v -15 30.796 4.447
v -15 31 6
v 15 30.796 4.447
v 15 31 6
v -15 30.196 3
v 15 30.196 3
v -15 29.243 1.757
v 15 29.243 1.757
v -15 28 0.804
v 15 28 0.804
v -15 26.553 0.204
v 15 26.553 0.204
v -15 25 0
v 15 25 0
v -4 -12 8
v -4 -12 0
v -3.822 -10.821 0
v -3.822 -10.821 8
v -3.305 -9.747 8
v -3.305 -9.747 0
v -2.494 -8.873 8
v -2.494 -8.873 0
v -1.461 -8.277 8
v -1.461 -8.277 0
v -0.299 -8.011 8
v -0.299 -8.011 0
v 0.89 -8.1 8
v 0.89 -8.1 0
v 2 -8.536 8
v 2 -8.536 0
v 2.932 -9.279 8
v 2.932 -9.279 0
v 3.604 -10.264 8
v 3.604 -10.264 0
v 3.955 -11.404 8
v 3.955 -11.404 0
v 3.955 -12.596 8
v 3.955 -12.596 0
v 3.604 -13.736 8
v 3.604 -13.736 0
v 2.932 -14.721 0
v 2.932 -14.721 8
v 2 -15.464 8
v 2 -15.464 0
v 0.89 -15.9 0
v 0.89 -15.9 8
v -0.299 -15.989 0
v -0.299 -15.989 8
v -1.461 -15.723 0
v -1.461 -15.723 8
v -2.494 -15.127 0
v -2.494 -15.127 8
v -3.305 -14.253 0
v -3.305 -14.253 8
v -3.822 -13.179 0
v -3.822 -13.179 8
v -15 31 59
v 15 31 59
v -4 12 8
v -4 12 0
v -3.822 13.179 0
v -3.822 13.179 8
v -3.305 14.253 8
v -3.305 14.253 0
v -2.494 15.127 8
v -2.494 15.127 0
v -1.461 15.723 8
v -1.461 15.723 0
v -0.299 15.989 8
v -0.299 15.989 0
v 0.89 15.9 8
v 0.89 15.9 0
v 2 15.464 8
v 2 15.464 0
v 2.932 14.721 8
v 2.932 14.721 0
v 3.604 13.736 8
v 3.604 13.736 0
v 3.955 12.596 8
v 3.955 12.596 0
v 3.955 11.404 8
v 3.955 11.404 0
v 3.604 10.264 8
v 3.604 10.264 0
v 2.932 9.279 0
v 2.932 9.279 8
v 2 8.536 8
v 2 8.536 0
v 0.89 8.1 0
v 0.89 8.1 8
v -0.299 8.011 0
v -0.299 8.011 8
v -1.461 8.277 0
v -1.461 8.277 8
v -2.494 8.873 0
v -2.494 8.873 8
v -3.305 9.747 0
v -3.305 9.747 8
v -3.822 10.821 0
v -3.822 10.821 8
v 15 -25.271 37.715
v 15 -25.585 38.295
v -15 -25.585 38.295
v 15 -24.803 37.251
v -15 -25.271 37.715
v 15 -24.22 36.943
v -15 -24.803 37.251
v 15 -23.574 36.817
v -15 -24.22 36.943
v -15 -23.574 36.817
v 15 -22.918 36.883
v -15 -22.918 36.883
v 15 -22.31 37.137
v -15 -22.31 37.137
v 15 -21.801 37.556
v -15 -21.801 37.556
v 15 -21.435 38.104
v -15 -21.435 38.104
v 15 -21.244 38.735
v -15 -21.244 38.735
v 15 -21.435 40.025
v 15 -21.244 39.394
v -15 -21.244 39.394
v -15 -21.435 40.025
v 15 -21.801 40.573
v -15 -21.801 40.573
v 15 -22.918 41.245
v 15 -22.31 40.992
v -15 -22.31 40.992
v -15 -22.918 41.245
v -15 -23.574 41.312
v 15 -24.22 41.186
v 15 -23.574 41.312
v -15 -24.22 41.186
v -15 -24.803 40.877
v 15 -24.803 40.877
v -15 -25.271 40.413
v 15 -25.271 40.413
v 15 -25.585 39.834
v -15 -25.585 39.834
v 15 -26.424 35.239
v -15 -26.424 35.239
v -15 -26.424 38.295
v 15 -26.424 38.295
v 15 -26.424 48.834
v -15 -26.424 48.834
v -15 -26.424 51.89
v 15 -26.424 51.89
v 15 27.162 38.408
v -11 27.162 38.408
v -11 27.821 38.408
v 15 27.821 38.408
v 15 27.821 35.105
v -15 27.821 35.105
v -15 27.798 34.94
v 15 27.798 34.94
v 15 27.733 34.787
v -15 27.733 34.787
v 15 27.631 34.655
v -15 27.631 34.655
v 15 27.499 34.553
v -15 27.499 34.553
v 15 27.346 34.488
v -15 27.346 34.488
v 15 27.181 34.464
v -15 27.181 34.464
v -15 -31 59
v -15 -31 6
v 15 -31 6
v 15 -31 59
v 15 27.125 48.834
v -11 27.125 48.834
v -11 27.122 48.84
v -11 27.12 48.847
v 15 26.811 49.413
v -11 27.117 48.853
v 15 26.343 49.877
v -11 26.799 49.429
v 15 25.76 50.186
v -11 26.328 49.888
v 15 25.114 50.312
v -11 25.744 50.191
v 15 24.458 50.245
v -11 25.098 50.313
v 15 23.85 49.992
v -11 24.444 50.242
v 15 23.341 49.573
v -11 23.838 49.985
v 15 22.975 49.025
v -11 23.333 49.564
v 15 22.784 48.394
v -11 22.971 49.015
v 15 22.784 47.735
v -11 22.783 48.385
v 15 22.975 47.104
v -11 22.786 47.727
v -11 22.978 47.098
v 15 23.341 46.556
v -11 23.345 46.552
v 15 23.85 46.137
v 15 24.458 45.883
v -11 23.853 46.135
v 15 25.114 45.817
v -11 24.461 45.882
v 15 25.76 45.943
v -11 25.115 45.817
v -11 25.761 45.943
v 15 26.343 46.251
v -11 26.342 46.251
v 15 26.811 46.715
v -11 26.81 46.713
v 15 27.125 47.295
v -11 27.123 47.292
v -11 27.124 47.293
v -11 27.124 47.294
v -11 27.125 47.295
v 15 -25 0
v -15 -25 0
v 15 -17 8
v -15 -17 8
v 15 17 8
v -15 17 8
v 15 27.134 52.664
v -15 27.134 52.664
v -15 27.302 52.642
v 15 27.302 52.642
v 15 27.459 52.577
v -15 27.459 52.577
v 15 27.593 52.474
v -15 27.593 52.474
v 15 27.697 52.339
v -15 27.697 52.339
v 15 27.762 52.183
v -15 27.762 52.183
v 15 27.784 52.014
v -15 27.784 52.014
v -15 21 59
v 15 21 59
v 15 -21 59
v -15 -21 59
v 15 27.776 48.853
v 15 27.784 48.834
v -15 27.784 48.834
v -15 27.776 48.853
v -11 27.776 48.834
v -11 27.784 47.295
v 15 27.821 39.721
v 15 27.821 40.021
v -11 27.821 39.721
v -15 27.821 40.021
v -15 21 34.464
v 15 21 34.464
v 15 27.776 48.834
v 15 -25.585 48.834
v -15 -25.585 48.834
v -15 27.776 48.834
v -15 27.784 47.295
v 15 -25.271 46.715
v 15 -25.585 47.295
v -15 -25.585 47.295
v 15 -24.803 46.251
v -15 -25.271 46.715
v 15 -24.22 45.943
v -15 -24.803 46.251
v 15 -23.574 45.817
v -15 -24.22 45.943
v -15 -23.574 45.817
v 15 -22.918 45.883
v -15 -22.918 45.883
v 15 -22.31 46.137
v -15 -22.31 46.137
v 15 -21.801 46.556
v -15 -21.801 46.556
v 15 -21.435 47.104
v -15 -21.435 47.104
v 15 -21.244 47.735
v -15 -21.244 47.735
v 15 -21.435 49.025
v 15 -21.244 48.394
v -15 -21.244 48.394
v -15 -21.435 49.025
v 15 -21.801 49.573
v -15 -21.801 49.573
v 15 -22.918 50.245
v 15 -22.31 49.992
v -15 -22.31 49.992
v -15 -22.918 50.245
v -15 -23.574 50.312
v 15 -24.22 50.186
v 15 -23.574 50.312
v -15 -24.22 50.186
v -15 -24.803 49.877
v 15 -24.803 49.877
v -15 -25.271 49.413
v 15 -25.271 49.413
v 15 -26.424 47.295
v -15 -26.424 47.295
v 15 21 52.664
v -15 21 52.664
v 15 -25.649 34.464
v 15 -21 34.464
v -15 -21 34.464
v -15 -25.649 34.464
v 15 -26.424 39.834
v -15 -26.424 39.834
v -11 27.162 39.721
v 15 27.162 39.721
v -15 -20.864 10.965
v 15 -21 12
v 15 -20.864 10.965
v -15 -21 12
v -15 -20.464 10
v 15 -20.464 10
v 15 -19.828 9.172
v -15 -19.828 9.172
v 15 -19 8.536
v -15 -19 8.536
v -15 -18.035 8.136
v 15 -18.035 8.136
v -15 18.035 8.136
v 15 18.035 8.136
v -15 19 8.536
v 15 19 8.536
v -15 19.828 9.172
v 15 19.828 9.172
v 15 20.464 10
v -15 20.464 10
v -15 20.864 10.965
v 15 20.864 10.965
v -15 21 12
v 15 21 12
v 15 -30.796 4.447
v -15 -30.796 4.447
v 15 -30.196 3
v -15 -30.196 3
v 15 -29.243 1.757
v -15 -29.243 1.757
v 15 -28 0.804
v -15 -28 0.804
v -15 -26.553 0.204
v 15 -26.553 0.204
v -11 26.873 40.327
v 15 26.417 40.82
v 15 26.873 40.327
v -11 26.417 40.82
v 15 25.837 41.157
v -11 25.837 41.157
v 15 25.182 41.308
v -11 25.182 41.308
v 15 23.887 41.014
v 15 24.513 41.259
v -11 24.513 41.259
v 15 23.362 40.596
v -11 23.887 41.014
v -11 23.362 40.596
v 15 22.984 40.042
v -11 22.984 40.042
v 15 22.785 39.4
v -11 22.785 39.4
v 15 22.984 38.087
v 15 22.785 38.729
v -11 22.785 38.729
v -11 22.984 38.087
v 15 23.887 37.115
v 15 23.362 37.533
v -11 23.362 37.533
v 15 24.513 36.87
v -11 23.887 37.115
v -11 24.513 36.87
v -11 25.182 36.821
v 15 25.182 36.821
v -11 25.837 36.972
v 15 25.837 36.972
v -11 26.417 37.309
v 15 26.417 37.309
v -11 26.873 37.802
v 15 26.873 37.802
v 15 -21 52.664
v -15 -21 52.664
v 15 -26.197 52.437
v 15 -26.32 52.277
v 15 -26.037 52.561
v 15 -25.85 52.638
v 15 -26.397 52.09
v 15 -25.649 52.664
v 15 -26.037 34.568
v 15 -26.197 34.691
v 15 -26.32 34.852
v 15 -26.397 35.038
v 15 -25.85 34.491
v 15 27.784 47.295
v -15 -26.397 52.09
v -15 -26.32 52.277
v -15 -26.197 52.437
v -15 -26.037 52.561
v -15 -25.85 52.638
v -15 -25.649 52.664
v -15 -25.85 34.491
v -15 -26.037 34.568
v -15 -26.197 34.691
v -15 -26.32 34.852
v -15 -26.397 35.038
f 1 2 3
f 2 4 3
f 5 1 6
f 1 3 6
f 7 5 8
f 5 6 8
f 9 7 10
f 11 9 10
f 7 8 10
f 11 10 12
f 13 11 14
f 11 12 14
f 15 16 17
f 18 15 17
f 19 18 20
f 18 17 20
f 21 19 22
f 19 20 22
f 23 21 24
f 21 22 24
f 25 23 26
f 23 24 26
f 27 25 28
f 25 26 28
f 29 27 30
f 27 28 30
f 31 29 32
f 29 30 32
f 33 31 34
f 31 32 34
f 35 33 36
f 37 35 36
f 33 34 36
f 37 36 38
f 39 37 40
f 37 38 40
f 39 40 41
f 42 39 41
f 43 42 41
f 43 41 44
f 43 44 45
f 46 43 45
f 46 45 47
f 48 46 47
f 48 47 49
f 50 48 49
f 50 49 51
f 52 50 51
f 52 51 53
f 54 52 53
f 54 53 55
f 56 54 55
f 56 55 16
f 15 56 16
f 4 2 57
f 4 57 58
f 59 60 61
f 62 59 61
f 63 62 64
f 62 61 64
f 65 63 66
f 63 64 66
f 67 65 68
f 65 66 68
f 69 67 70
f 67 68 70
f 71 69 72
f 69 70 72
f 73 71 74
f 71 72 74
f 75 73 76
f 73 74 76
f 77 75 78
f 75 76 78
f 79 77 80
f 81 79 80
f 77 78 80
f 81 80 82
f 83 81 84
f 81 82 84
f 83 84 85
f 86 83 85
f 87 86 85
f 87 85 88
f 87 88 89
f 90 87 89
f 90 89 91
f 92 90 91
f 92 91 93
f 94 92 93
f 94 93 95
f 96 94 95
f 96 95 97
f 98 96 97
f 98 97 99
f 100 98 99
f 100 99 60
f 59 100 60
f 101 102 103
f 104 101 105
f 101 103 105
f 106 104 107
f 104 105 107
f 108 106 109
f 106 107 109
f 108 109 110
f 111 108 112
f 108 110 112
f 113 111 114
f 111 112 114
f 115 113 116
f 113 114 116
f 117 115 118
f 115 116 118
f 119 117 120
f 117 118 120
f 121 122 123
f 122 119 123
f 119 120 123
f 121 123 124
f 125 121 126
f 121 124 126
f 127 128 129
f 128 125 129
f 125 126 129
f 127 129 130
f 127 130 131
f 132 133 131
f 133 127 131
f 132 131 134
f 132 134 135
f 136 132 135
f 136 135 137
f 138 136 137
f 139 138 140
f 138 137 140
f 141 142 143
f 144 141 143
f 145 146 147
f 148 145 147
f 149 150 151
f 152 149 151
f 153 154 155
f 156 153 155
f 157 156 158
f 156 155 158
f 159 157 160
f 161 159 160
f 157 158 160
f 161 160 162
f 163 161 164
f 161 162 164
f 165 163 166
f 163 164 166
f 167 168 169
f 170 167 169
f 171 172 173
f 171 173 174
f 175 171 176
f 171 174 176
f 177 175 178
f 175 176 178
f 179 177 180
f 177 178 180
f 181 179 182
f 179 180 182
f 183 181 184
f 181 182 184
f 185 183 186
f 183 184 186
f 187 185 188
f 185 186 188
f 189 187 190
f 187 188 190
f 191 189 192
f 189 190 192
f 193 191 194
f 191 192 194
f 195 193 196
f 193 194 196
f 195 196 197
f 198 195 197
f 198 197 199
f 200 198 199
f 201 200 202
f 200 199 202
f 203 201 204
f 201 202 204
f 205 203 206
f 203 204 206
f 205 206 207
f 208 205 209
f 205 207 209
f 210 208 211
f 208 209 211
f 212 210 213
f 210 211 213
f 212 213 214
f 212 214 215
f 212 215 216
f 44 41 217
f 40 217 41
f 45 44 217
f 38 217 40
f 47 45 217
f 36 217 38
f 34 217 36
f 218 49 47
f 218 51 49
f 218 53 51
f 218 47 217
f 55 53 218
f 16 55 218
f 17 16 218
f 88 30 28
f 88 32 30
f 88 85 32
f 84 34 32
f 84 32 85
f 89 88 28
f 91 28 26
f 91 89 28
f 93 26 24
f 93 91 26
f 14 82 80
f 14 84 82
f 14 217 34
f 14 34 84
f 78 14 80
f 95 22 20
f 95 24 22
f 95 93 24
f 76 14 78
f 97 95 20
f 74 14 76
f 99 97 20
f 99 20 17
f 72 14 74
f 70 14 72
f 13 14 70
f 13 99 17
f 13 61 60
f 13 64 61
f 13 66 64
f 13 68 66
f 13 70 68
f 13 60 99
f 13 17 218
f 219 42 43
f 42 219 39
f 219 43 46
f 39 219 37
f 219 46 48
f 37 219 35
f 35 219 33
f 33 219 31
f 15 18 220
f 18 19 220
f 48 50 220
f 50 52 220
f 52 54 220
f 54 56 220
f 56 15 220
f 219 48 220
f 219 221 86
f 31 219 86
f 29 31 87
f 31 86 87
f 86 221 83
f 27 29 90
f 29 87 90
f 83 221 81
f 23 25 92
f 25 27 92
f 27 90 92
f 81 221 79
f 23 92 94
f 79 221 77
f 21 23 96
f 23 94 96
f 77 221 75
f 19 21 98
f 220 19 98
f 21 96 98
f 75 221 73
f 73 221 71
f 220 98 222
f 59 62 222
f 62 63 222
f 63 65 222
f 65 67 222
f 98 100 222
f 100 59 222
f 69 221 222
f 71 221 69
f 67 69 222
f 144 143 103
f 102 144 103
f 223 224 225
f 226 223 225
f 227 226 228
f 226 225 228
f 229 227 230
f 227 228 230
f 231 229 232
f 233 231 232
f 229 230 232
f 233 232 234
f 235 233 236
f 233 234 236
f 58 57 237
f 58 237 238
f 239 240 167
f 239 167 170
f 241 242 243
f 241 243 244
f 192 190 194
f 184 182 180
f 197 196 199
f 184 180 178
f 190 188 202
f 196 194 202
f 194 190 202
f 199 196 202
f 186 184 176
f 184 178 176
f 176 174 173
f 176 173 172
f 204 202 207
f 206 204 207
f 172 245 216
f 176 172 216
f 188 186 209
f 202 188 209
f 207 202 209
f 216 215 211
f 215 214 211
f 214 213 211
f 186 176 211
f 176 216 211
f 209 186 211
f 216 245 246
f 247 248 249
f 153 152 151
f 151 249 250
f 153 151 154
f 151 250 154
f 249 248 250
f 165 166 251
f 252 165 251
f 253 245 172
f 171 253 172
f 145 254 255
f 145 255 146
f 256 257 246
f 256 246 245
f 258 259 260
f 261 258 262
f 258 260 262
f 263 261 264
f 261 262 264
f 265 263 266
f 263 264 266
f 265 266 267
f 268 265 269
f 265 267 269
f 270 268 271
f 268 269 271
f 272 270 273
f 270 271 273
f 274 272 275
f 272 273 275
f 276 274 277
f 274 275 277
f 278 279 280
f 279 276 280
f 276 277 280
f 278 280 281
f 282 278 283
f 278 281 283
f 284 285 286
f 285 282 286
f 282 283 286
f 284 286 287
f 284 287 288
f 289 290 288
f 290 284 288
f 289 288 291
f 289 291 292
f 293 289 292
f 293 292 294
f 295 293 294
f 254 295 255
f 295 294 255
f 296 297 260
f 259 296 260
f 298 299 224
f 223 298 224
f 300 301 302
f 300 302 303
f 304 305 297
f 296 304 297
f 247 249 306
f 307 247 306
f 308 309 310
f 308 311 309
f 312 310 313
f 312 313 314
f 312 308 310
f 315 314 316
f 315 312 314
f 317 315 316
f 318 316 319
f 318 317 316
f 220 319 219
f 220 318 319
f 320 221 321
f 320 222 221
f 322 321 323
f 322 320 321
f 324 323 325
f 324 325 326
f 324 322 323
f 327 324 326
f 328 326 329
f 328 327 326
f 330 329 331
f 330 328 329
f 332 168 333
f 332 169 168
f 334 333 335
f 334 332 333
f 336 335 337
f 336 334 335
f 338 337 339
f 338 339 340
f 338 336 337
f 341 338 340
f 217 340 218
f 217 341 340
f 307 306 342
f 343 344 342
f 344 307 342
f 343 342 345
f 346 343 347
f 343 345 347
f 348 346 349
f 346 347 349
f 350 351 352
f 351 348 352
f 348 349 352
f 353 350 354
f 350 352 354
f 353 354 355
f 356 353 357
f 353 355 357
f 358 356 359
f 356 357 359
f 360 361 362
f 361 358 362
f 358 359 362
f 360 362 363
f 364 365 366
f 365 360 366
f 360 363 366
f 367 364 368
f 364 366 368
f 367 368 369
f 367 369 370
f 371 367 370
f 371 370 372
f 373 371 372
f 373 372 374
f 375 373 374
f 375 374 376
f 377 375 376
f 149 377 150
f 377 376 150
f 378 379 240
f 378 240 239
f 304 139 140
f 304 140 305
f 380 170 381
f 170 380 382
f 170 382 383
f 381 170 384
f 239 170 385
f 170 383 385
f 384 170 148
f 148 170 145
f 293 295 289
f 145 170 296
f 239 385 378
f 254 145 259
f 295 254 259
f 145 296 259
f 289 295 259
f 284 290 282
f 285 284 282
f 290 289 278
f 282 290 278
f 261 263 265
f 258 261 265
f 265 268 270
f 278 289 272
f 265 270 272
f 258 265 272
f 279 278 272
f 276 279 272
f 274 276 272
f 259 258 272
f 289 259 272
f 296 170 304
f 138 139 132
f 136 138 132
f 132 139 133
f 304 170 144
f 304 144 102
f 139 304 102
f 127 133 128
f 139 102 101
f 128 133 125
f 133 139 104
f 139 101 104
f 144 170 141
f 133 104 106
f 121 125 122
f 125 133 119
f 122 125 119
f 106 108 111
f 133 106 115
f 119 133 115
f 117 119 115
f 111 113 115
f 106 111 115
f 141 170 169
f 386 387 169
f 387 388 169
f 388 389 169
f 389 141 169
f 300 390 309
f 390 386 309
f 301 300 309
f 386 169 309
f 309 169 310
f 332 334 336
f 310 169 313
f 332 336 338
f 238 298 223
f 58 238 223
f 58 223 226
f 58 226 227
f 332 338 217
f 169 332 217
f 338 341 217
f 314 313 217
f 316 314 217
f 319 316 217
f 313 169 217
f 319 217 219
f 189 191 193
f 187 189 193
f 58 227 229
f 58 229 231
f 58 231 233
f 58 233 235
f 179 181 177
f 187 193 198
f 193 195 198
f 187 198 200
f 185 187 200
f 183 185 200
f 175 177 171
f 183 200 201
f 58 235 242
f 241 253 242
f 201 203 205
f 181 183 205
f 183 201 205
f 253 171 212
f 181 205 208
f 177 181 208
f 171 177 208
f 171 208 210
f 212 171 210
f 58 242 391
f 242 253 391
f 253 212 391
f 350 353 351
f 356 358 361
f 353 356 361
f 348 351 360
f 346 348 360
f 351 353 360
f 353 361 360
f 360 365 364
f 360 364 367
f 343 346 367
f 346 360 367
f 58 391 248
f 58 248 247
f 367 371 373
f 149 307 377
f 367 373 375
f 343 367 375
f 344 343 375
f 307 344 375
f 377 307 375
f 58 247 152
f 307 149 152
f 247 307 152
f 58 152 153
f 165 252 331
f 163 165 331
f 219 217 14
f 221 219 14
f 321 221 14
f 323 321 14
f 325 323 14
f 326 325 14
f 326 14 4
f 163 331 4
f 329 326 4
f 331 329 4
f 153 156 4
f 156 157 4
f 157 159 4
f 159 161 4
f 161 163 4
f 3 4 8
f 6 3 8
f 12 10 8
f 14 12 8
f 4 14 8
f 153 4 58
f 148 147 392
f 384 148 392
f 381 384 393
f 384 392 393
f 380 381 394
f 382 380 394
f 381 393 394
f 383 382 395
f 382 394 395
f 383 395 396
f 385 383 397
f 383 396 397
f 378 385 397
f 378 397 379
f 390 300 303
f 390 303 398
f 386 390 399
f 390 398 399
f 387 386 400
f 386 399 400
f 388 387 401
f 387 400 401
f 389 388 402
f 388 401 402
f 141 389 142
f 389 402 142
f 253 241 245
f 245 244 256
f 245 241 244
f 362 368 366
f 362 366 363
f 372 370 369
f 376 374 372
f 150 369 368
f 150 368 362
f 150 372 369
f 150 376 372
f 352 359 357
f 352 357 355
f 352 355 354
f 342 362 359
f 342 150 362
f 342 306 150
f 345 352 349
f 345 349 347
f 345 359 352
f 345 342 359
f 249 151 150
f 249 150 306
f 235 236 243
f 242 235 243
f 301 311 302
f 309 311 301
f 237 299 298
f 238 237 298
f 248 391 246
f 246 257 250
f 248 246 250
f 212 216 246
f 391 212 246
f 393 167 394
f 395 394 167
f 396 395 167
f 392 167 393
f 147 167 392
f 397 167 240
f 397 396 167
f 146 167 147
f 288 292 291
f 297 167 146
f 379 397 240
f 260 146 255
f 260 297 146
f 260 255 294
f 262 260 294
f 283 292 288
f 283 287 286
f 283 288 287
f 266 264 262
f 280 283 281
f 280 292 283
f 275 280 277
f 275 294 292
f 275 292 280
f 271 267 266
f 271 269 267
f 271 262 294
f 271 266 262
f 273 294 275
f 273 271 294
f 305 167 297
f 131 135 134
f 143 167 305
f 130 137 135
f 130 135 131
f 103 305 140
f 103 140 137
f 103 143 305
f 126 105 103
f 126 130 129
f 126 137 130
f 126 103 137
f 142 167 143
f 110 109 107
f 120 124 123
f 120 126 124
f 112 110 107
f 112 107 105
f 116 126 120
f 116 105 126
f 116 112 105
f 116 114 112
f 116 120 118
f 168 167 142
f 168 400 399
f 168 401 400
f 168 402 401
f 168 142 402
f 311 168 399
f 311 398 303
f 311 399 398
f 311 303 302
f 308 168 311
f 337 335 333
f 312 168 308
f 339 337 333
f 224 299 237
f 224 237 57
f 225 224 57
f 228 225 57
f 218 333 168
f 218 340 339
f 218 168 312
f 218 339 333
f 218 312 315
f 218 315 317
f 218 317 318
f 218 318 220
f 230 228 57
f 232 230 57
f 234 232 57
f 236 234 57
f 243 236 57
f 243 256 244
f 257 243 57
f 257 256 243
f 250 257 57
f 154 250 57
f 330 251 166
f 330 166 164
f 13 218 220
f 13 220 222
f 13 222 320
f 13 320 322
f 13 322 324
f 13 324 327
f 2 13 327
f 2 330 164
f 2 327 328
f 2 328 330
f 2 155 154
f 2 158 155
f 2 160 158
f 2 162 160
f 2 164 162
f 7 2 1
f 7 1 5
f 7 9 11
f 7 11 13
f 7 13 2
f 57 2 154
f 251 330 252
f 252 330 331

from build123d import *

# Parameters (mm, degrees)
ESBO_O1_W                  = 30
ESBO_O1_H                  = 10
RESSALTO_EXTRUS_O1_DEPTH   = 59
RESSALTO_EXTRUS_O1_2_DEPTH = 59
ESBO_O2_W                  = 30
ESBO_O2_H                  = 42
RESSALTO_EXTRUS_O2_DEPTH   = 8
CORTE_EXTRUS_O1_DEPTH      = 31
CORTE_EXTRUS_O2_DEPTH      = 4
FILETE1_R                  = 4
ESBO_O5_R                  = 4
CORTE_EXTRUS_O3_DEPTH      = 60
FILETE2_R                  = 6


with BuildPart() as part:
    # Esboço1 → Ressalto-extrusão1 (new body)
    with BuildSketch(Plane.XY):
        with Locations((0, 26)):
            Rectangle(ESBO_O1_W, ESBO_O1_H)
    extrude(amount=RESSALTO_EXTRUS_O1_DEPTH)



with BuildPart() as body_2:
    # Esboço1 → Ressalto-extrus_o1 2 (new body)
    with BuildSketch(Plane.XY):
        with Locations((0, -26)):
            Rectangle(ESBO_O1_W, ESBO_O1_H)
    extrude(amount=RESSALTO_EXTRUS_O1_2_DEPTH)


with BuildPart() as part_1:
    add(part.part)

    add(body_2.part)  # Ressalto-extrusão2 merges body 2
    # Esboço2 → Ressalto-extrusão2 (add)
    with BuildSketch(Plane(origin=(0, 0, 0), x_dir=(-1, 0, 0), z_dir=(0, 0, -1))):
        Rectangle(ESBO_O2_W, ESBO_O2_H)
    extrude(amount=-RESSALTO_EXTRUS_O2_DEPTH)

    # Esboço3 → Corte-extrusão1 (cut, through all)
    with BuildSketch(Plane.ZY.offset(15)):
        with BuildLine():
            Line((34.464319348, 27.180824333), (34.464319348, 21))
            Line((34.464319348, 21), (52.664319348, 21))
            Line((52.664319348, 21), (52.664319348, 27.13384671))
            ThreePointArc((52.664319348, 27.13384671), (52.473932816, 27.593480457), (52.014299068, 27.783866989))
            Line((52.014299068, 27.783866989), (48.83365389, 27.783866989))
            Line((48.83365389, 27.783866989), (48.853388433, 27.775806736))
            Line((48.853388433, 27.775806736), (48.83365389, 27.775908805))
            Line((48.83365389, 27.775908805), (48.83365389, 27.124623249))
            ThreePointArc((48.83365389, 27.124623249), (48.064319348, 22.760238146), (47.294984805, 27.124623249))
            Line((47.294984805, 27.124623249), (47.294984805, 27.783866989))
            Line((47.294984805, 27.783866989), (40.021105511, 27.821488377))
            Line((40.021105511, 27.821488377), (39.721105511, 27.821488377))
            Line((39.721105511, 27.821488377), (39.721105511, 27.162244637))
            ThreePointArc((39.721105511, 27.162244637), (39.064319348, 22.760238146), (38.407533184, 27.162244637))
            Line((38.407533184, 27.162244637), (38.407533184, 27.821488377))
            Line((38.407533184, 27.821488377), (35.104983392, 27.821488377))
            ThreePointArc((35.104983392, 27.821488377), (34.654639493, 27.631168232), (34.464319348, 27.180824333))
        make_face()
        with BuildLine():
            ThreePointArc((51.8897547, -26.423845407), (52.437454615, -26.196980674), (52.664319348, -25.649280759))
            Line((52.664319348, -25.649280759), (52.664319348, -20.77))
            Line((52.664319348, -20.77), (34.5, -20.77))
            Line((34.5, -20.77), (34.464319348, -20.770417185))
            Line((34.464319348, -20.770417185), (34.464319348, -25.649280759))
            ThreePointArc((34.464319348, -25.649280759), (34.69118408, -26.196980674), (35.238883995, -26.423845407))
            Line((35.238883995, -26.423845407), (38.294984805, -26.423845407))
            Line((38.294984805, -26.423845407), (38.294984805, -25.584623249))
            ThreePointArc((38.294984805, -25.584623249), (39.064319348, -21.220238146), (39.83365389, -25.584623249))
            Line((39.83365389, -25.584623249), (39.83365389, -26.423845407))
            Line((39.83365389, -26.423845407), (47.294984805, -26.423845407))
            Line((47.294984805, -26.423845407), (47.294984805, -25.584623249))
            ThreePointArc((47.294984805, -25.584623249), (48.064319348, -21.220238146), (48.83365389, -25.584623249))
            Line((48.83365389, -25.584623249), (48.83365389, -26.423845407))
            Line((48.83365389, -26.423845407), (51.8897547, -26.423845407))
        make_face()
    extrude(amount=-CORTE_EXTRUS_O1_DEPTH, mode=Mode.SUBTRACT)

    # Esboço4 → Corte-extrusão2 (cut)
    with BuildSketch(Plane.ZY.offset(15)):
        with BuildLine():
            Line((47.294984805, 27.783866989), (48.853388433, 27.775806736))
            Line((48.853388433, 27.775806736), (48.853388433, 27.117338044))
            ThreePointArc((48.853388433, 27.117338044), (48.055619332, 22.760254966), (47.291568671, 27.123377136))
            Line((47.291568671, 27.123377136), (47.294984805, 27.783866989))
        make_face()
        with BuildLine():
            Line((38.407533184, 27.821488377), (38.407533184, 27.162244637))
            ThreePointArc((38.407533184, 27.162244637), (39.064319348, 22.760238146), (39.721105511, 27.162244637))
            Line((39.721105511, 27.162244637), (39.721105511, 27.821488377))
            Line((39.721105511, 27.821488377), (38.407533184, 27.821488377))
        make_face()
    extrude(amount=-CORTE_EXTRUS_O2_DEPTH, mode=Mode.SUBTRACT)

    # Filete1
    filete1_edges = [part_1.edges().sort_by_distance(p)[0] for p in [
        (0, 21, 8),
        (0, -21, 8),
    ]]
    fillet(filete1_edges, radius=FILETE1_R)

    # Esboço5 → Corte-extrusão3 (cut, through all)
    with BuildSketch(Plane(origin=(0, 0, 0), x_dir=(-1, 0, 0), z_dir=(0, 0, -1))):
        with Locations((0, -12)):
            Circle(ESBO_O5_R)
        with Locations((0, 12)):
            Circle(ESBO_O5_R)
    extrude(amount=-CORTE_EXTRUS_O3_DEPTH, mode=Mode.SUBTRACT)

    # Filete2
    filete2_edges = [part_1.edges().sort_by_distance(p)[0] for p in [
        (0, -31, 0),
        (0, 31, 0),
    ]]
    fillet(filete2_edges, radius=FILETE2_R)


solid = part_1.part
